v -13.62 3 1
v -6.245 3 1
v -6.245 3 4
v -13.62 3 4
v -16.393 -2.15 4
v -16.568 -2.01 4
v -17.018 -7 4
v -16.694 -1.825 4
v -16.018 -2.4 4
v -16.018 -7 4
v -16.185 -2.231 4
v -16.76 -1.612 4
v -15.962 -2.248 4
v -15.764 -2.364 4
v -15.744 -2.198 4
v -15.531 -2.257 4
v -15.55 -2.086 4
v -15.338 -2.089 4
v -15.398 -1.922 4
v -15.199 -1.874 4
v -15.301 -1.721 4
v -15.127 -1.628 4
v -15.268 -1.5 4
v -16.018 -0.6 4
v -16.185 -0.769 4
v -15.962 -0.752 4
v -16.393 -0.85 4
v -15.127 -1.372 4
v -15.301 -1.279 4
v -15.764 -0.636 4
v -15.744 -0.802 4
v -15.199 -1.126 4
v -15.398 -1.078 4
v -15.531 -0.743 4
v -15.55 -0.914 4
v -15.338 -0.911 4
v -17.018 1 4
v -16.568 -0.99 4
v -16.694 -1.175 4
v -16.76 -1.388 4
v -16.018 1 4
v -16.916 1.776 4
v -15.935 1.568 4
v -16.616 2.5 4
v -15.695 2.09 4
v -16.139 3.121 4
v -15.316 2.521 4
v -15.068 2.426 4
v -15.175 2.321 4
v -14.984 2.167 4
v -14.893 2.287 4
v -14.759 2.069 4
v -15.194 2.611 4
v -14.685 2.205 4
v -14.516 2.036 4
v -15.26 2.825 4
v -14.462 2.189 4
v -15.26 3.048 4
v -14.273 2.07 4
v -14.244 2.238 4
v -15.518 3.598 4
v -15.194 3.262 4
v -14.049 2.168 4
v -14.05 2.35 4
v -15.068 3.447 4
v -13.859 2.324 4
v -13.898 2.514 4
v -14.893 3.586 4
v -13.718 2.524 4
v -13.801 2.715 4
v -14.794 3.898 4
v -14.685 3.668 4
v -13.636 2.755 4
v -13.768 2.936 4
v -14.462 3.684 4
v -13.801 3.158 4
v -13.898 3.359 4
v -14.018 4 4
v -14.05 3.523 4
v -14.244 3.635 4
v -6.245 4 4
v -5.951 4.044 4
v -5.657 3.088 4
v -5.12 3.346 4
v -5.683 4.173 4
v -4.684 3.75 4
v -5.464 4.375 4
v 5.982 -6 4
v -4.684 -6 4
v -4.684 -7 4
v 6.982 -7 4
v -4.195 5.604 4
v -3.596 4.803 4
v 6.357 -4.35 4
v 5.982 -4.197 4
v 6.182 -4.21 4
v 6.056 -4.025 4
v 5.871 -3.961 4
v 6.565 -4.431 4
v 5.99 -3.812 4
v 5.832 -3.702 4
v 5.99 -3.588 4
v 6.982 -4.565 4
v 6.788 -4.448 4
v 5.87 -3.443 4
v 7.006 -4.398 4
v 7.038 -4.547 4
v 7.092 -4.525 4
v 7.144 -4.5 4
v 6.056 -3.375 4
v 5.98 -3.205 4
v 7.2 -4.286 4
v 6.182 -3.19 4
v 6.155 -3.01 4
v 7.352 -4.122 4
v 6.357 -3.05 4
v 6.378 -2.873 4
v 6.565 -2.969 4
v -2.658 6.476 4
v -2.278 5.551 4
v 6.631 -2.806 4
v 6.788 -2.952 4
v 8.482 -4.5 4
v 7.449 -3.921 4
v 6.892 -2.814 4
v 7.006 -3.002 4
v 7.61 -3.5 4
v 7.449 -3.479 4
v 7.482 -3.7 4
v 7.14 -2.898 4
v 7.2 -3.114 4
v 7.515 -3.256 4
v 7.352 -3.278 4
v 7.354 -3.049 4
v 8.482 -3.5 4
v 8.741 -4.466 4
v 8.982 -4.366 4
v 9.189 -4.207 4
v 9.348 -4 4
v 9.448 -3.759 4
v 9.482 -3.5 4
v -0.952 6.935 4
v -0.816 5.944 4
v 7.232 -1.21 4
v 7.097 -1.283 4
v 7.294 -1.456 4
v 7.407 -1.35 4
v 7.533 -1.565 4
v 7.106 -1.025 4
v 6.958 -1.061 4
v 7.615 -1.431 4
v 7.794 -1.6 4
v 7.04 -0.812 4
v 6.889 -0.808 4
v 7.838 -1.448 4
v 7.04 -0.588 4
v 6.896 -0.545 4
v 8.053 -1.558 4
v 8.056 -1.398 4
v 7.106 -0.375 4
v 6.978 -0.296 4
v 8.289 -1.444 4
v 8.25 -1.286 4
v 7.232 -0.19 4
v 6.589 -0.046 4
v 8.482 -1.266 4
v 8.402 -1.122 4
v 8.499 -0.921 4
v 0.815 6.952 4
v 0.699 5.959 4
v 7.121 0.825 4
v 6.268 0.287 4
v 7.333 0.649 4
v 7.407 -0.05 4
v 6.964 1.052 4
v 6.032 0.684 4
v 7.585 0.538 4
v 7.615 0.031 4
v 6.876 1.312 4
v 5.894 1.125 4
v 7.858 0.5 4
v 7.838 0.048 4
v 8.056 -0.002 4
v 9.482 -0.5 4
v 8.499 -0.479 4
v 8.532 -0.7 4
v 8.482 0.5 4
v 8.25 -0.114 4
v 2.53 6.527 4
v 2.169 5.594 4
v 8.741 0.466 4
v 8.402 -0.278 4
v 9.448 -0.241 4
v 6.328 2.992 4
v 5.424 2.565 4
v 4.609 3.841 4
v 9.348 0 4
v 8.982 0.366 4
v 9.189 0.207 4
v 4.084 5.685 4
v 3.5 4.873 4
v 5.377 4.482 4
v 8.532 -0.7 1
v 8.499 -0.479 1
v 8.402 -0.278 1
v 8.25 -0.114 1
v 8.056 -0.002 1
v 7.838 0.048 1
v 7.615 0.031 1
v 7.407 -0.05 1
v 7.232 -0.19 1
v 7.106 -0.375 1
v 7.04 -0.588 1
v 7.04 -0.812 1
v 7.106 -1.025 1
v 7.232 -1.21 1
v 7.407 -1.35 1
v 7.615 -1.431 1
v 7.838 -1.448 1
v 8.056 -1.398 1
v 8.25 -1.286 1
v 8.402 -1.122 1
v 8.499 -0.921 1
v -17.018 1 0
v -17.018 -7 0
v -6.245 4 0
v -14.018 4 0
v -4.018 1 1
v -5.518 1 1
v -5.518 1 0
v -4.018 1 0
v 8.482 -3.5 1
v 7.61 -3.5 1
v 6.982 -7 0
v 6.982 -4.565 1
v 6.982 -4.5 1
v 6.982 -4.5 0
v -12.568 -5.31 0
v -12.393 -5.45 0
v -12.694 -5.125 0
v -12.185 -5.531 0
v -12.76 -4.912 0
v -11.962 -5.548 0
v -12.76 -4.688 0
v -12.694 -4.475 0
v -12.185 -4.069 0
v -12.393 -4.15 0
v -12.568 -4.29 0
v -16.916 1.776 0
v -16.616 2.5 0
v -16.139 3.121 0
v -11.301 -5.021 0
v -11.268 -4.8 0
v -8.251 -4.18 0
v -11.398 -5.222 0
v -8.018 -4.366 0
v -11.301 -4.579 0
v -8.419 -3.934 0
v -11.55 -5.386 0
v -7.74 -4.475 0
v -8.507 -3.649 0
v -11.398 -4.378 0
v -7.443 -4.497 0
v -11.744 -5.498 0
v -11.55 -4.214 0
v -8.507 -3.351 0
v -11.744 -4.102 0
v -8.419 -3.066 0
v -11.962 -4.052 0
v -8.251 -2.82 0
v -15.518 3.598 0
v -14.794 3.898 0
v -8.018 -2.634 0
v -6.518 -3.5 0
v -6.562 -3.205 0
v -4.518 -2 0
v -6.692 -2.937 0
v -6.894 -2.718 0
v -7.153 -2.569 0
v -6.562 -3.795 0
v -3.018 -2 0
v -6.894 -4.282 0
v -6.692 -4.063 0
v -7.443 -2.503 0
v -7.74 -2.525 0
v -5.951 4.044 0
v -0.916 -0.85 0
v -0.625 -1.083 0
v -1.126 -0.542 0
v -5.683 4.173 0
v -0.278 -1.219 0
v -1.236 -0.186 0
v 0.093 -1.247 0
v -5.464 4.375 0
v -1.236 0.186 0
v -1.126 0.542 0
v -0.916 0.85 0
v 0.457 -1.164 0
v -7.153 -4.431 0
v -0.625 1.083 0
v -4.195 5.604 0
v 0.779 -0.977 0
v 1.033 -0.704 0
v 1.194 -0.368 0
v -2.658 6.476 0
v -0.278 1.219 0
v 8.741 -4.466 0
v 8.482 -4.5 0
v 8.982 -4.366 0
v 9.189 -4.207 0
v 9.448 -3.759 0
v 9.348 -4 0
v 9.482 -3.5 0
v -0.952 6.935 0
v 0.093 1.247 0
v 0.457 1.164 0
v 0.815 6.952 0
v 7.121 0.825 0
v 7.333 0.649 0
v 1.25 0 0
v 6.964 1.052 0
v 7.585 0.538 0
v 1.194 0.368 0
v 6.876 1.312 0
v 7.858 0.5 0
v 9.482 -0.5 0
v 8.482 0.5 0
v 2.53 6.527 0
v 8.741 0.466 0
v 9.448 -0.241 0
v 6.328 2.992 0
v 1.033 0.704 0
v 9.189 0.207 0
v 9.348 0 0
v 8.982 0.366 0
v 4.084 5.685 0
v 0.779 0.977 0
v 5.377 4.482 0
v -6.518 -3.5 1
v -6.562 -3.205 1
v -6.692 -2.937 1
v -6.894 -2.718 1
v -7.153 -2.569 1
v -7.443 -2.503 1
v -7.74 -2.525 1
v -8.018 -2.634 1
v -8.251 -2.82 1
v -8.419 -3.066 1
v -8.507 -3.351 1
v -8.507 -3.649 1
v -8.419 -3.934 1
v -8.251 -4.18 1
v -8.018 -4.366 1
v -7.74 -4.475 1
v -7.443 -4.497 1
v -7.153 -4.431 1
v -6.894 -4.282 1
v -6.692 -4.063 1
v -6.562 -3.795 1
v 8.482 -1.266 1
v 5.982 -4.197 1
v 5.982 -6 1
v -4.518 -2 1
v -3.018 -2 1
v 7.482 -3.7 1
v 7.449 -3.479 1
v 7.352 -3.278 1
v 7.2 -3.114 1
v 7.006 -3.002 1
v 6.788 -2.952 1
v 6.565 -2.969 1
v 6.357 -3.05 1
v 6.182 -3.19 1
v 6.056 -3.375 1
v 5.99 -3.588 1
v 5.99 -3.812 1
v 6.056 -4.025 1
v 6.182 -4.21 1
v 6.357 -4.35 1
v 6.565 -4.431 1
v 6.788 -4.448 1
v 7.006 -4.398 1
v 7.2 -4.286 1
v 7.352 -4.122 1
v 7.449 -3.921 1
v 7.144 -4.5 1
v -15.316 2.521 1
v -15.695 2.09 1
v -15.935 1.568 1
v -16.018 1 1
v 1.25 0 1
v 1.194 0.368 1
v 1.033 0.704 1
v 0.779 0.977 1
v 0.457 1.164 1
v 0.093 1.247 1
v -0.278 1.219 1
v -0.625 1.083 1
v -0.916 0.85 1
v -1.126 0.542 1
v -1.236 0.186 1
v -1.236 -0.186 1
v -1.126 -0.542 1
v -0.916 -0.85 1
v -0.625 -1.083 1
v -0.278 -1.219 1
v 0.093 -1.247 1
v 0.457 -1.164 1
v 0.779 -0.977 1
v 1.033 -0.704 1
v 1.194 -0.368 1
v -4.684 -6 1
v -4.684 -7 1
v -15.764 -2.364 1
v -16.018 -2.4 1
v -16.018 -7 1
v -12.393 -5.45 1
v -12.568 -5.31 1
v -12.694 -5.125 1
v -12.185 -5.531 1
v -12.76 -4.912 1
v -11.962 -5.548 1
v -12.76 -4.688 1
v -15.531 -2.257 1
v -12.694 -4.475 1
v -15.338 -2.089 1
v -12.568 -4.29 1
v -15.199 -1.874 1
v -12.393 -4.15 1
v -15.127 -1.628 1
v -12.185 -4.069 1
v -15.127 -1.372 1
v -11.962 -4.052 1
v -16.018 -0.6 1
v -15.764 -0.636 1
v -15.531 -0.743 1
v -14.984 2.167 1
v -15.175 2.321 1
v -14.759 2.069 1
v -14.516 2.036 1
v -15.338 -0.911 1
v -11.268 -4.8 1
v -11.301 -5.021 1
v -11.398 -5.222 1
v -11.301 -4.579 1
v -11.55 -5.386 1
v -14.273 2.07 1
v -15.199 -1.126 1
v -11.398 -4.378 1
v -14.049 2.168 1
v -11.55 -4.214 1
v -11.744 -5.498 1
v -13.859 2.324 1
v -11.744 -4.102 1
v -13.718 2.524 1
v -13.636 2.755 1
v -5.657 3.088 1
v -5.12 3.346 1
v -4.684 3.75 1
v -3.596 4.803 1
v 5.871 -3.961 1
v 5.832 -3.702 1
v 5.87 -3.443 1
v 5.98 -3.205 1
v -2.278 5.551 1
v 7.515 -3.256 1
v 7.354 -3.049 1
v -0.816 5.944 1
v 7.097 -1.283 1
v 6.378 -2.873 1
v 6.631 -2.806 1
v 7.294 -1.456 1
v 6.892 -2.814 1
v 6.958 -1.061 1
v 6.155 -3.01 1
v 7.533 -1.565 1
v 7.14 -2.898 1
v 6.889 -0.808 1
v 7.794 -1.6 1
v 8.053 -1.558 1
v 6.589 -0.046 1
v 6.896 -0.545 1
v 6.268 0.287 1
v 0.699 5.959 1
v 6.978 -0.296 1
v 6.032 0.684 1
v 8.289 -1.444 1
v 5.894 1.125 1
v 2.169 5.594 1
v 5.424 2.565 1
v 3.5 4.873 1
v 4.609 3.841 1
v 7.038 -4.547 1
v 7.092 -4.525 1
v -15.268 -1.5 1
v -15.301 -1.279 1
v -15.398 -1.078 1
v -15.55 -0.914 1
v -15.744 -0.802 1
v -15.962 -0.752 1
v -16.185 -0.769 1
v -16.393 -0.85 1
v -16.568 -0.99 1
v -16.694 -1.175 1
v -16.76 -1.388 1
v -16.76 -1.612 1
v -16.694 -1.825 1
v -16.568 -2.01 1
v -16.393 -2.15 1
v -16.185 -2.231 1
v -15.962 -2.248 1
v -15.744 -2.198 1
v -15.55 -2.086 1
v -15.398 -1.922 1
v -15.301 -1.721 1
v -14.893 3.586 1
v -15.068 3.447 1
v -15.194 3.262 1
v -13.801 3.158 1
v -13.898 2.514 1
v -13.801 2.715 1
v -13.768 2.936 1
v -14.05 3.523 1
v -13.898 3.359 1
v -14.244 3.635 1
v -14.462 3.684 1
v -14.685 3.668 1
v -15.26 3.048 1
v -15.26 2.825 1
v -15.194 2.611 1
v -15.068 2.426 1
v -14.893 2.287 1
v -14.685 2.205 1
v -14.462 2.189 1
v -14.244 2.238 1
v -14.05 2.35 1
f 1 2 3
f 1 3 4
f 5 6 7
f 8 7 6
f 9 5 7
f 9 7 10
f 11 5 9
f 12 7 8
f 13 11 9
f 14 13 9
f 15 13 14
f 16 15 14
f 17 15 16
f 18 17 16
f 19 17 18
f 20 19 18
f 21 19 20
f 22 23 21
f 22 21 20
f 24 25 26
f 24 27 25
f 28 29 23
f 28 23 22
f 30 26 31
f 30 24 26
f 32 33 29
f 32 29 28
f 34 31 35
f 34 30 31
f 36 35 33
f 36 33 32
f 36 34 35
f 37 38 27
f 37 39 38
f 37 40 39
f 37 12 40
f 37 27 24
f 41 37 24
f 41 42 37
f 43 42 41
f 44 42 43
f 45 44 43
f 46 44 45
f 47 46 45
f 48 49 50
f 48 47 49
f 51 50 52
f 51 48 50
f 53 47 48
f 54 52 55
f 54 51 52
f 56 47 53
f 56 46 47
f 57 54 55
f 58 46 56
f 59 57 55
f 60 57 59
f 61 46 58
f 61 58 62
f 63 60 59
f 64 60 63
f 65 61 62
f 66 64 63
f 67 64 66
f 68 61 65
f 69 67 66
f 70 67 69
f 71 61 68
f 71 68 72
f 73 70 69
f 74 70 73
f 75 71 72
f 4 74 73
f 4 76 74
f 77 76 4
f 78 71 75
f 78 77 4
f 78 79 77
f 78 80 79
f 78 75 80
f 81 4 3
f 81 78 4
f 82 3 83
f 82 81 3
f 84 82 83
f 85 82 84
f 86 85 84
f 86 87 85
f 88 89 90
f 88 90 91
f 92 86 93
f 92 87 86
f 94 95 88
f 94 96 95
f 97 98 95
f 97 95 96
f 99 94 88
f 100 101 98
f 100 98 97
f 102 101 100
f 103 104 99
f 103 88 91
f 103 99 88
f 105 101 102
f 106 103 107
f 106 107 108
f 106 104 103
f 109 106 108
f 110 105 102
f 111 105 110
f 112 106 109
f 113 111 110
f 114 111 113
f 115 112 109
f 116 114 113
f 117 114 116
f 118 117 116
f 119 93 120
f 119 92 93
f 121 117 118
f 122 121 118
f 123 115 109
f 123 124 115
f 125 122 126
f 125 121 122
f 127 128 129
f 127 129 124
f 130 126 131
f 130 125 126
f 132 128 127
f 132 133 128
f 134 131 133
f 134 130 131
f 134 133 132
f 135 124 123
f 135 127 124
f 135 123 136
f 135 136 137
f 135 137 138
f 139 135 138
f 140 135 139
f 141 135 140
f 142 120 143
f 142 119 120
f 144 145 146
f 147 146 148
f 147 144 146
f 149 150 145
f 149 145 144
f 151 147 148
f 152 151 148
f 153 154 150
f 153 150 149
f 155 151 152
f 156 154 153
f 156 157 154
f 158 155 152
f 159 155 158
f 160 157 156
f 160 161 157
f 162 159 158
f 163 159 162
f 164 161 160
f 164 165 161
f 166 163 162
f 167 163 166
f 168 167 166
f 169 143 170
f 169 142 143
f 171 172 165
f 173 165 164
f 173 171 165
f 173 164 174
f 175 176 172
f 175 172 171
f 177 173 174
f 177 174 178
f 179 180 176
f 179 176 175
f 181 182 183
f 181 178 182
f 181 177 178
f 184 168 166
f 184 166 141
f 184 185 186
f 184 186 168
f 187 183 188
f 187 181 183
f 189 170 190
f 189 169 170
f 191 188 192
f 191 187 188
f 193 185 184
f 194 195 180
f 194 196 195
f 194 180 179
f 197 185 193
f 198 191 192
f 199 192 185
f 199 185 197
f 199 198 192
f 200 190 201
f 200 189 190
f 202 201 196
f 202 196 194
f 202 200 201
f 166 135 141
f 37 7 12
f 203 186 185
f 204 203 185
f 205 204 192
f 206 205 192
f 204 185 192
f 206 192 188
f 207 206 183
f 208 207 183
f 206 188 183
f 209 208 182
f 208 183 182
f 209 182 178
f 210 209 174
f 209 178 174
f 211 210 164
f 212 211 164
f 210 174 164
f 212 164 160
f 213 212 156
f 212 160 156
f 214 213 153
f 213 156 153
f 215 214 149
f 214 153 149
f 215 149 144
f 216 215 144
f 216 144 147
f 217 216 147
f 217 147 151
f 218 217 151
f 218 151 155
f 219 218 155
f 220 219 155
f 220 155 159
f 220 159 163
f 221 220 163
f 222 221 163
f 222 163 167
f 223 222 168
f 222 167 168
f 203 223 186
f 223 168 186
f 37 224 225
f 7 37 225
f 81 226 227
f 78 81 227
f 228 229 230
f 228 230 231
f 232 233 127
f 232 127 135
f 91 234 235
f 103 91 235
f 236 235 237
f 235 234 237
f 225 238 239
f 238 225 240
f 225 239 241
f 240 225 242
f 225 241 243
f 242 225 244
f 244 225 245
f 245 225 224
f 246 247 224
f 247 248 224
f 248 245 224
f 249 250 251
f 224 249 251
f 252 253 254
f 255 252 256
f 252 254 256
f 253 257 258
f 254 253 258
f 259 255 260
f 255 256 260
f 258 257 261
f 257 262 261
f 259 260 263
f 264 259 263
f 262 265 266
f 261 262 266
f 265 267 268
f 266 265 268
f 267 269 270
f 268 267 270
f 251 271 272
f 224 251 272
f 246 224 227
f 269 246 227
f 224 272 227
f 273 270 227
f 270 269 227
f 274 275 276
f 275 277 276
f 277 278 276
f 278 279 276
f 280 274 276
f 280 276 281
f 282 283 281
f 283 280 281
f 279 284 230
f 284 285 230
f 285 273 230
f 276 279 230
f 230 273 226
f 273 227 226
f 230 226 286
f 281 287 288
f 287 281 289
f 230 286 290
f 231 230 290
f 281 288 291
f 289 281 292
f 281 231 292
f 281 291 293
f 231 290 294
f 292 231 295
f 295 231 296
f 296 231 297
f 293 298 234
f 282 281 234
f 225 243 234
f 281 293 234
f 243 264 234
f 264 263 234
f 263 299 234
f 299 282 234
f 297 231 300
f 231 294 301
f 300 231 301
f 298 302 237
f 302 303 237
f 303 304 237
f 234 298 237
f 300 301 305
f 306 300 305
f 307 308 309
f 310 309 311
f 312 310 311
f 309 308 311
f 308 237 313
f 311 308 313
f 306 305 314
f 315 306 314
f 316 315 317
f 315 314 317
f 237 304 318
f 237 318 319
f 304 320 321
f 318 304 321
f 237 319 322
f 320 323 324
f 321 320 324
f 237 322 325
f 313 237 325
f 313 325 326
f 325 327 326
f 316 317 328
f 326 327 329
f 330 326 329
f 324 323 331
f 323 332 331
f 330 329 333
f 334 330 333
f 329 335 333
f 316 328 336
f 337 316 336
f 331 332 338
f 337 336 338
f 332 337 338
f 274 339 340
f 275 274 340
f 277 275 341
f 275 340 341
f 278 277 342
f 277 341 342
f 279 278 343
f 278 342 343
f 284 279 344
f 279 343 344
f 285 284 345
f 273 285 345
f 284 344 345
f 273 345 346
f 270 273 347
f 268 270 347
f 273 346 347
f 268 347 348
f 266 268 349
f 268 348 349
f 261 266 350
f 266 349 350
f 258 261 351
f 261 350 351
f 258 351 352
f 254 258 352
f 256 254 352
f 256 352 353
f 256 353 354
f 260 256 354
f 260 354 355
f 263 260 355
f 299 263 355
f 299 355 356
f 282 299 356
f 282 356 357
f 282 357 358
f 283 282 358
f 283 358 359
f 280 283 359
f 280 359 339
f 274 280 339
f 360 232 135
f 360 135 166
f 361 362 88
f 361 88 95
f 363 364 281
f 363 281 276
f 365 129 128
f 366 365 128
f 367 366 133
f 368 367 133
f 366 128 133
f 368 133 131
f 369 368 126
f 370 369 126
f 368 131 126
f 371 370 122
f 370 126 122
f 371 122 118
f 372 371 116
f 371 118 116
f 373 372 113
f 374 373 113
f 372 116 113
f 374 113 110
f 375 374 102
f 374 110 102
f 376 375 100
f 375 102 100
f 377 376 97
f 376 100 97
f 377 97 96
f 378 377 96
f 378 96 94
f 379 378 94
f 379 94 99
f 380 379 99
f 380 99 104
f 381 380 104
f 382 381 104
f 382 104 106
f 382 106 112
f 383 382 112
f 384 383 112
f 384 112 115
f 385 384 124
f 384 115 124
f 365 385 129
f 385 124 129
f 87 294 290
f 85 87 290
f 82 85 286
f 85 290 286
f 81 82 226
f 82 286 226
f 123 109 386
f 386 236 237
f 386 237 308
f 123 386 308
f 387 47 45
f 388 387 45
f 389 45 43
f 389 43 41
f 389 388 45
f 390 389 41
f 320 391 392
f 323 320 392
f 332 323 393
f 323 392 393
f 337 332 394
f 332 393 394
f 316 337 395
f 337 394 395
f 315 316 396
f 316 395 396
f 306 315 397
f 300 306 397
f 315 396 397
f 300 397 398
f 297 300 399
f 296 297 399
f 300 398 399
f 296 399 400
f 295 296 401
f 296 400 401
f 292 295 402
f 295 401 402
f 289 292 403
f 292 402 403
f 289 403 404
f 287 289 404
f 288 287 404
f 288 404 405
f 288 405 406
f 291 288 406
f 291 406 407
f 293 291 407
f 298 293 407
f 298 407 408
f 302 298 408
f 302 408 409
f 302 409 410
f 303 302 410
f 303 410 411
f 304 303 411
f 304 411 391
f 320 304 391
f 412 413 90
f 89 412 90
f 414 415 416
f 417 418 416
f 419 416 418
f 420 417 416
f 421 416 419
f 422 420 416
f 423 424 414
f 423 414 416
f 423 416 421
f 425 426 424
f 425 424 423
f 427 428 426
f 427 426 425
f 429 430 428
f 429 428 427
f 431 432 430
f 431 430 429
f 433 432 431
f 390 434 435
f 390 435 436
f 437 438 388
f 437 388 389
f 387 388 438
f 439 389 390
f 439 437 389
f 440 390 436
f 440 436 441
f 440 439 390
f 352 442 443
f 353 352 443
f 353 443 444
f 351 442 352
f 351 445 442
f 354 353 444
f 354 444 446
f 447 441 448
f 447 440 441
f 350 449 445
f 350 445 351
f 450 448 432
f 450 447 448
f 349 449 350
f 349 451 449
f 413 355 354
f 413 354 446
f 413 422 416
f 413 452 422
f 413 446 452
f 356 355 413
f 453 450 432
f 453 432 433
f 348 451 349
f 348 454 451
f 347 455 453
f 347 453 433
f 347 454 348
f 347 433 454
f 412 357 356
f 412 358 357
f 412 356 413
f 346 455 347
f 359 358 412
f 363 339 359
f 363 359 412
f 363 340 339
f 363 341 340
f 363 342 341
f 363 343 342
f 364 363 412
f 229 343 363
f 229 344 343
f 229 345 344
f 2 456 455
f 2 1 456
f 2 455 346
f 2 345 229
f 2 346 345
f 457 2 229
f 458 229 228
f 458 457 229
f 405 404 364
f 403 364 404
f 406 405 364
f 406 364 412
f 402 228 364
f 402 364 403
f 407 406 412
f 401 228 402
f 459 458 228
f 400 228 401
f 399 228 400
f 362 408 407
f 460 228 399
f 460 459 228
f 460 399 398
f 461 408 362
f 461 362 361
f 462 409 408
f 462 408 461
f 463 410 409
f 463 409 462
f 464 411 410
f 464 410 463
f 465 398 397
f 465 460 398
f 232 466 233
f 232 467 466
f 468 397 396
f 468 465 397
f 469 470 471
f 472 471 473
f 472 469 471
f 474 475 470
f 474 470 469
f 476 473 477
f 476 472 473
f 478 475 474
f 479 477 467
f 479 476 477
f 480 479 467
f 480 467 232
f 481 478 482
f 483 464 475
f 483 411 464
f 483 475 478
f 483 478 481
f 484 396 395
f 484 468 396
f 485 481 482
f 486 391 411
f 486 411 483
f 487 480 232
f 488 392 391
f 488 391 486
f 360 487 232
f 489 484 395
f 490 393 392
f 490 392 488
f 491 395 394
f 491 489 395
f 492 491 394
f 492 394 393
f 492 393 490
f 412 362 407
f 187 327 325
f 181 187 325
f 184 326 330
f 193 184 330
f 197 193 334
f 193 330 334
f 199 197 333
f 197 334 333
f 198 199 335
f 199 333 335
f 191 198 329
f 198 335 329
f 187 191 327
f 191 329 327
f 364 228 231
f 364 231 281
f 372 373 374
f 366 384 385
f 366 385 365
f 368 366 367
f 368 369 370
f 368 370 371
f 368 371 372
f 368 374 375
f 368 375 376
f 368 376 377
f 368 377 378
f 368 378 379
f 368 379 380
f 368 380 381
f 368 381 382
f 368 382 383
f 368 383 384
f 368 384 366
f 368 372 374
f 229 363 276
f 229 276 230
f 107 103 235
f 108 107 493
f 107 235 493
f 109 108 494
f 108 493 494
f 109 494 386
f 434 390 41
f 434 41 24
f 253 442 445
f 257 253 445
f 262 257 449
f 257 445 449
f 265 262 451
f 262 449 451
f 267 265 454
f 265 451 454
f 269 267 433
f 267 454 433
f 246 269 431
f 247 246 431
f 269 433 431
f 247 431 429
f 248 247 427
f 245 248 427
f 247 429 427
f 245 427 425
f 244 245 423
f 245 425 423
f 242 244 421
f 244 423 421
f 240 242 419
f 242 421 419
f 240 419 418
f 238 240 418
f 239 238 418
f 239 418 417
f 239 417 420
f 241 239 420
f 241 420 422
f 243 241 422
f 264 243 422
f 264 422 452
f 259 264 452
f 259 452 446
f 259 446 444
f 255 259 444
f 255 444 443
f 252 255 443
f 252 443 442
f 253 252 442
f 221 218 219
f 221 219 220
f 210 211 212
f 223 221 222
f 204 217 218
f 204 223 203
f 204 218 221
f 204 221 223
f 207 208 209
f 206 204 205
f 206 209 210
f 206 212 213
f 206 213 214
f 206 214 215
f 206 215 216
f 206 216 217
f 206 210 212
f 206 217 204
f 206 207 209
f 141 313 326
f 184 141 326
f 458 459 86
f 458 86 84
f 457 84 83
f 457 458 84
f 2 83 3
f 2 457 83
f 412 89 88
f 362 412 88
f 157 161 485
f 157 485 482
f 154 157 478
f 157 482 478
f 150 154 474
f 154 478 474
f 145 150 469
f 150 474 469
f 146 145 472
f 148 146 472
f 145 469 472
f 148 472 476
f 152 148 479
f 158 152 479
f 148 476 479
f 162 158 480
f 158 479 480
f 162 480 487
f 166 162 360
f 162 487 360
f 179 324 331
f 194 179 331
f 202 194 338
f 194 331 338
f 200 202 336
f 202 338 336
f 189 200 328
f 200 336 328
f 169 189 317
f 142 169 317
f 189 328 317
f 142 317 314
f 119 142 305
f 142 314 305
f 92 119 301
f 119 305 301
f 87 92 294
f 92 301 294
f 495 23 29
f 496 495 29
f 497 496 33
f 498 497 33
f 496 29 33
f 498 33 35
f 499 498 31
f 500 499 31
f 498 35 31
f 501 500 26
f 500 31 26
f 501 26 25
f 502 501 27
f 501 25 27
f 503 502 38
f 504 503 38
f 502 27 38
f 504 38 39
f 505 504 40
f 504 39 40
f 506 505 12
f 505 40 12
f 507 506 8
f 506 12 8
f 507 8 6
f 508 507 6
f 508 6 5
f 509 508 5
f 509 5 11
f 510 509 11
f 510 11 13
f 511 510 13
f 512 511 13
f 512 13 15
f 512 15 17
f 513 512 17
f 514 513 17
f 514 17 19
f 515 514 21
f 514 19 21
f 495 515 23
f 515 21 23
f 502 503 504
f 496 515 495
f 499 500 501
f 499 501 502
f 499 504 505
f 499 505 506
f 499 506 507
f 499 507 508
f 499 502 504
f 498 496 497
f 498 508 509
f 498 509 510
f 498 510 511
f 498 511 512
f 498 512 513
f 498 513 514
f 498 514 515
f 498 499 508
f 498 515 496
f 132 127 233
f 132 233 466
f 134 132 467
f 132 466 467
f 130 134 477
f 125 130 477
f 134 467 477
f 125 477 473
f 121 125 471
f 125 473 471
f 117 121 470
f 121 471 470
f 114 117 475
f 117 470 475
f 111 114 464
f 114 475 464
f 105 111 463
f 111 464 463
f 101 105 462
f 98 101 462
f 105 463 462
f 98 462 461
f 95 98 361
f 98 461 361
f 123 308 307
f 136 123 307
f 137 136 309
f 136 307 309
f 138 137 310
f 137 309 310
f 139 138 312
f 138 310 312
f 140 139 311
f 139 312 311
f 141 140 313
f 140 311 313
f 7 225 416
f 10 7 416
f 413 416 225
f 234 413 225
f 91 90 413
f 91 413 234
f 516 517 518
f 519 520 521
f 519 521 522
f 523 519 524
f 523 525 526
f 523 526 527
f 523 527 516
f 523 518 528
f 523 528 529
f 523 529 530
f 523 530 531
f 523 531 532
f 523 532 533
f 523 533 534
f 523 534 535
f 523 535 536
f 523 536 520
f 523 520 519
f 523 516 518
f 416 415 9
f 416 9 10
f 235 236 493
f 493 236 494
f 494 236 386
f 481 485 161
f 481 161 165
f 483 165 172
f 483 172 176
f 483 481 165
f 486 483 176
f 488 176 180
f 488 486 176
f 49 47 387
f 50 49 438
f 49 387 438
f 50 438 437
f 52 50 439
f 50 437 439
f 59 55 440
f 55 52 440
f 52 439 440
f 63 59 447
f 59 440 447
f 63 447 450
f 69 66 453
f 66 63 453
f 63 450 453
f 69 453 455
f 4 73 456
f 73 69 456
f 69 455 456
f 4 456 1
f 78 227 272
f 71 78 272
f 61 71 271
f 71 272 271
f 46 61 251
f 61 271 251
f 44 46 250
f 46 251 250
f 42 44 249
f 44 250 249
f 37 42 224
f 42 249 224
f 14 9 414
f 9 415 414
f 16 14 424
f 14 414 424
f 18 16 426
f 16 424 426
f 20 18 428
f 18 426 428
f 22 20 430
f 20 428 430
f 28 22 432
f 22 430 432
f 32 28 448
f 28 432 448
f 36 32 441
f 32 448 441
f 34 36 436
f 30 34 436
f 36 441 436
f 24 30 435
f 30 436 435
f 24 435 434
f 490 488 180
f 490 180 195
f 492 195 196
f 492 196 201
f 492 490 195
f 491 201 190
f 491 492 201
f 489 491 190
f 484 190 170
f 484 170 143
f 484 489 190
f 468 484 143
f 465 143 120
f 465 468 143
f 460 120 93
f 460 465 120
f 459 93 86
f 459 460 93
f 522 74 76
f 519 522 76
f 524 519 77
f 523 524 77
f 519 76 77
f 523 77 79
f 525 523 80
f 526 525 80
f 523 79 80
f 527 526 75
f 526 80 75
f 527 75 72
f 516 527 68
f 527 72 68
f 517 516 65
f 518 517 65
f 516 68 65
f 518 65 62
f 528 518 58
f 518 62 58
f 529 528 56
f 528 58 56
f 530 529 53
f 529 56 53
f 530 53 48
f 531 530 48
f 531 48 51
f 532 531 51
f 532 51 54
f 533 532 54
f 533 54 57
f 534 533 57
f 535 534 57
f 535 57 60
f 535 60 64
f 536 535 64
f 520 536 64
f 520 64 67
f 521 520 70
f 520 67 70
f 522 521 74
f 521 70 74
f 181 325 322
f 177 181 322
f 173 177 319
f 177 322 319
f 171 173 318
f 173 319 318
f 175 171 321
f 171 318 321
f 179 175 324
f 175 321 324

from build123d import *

# Parameters (mm, degrees)
BOSS_EXTRUDE1_DEPTH = 4
SHELL1_START        = 1
SHELL1_DEPTH        = 3
SKETCH2_R           = 1.25
SKETCH2_R_2         = 0.75
SKETCH2_R_3         = 1
CUT_EXTRUDE1_DEPTH  = 10
SKETCH3_W           = 10.665868521
SKETCH3_H           = 3
BOSS_EXTRUDE2_DEPTH = 1
SKETCH4_R           = 0.9
BOSS_EXTRUDE3_DEPTH = 3
SKETCH5_R           = 0.75
CUT_EXTRUDE2_DEPTH  = 3


# Read off the part's stored shape, not the designer's step: Shell1
with BuildPart() as part:
    # Sketch1 → Boss-Extrude1 (new body)
    with BuildSketch(Plane.XY):
        with BuildLine():
            Line((-17.017879978, -7), (6.982120022, -7))
            Line((6.982120022, -7), (6.982120022, -5.5))
            Line((6.982120022, -5.5), (6.982120022, -4.5))
            Line((6.982120022, -4.5), (7.982120022, -4.5))
            Line((7.982120022, -4.5), (8.482120022, -4.5))
            ThreePointArc((8.482120022, -4.5), (9.189226803, -4.207106781), (9.482120022, -3.5))
            Line((9.482120022, -3.5), (9.482120022, -0.5))
            ThreePointArc((9.482120022, -0.5), (9.189226803, 0.207106781), (8.482120022, 0.5))
            Line((8.482120022, 0.5), (7.858116823, 0.5))
            ThreePointArc((7.858116823, 0.5), (7.220739384, 0.72944825), (6.87585222, 1.3125))
            ThreePointArc((6.87585222, 1.3125), (1.68605895, 6.793909421), (-5.464373249, 4.375))
            ThreePointArc((-5.464373249, 4.375), (-5.811985297, 4.098612181), (-6.244997998, 4))
            Line((-6.244997998, 4), (-14.017879978, 4))
            ThreePointArc((-14.017879978, 4), (-16.139200322, 3.121320344), (-17.017879978, 1))
            Line((-17.017879978, 1), (-17.017879978, -7))
        make_face()
    extrude(amount=BOSS_EXTRUDE1_DEPTH)

    # Shell1 outline → Shell1 (cut)
    with BuildSketch(Plane.XY.offset(SHELL1_START)):
        with BuildLine():
            Line((-16.017879978, 1), (-16.017879978, -7))
            Line((-16.017879978, -7), (5.982120022, -7))
            Line((5.982120022, -7), (5.982120022, -3.5))
            Line((5.982120022, -3.5), (8.482120022, -3.5))
            Line((8.482120022, -3.5), (8.482120022, -0.5))
            Line((8.482120022, -0.5), (7.858116823, -0.5))
            ThreePointArc((7.858116823, -0.5), (6.583361944, -0.041103501), (5.893587617, 1.125))
            ThreePointArc((5.893587617, 1.125), (1.445193386, 5.823350932), (-4.683748499, 3.75))
            ThreePointArc((-4.683748499, 3.75), (-5.378972594, 3.197224362), (-6.244997998, 3))
            Line((-6.244997998, 3), (-14.017879978, 3))
            ThreePointArc((-14.017879978, 3), (-15.43209354, 2.414213562), (-16.017879978, 1))
        make_face()
    extrude(amount=SHELL1_DEPTH, mode=Mode.SUBTRACT)

    # Sketch2 → Cut-Extrude1 (cut)
    with BuildSketch(Plane.XY.offset(1)):
        Circle(SKETCH2_R)
        with Locations((-12.017879978, -4.8)):
            Circle(SKETCH2_R_2)
        with Locations((-7.517879978, -3.5)):
            Circle(SKETCH2_R_3)
        Polygon((-5.517879978, 1), (-4.017879978, 1), (-3.017879978, -2), (-4.517879978, -2), align=None)
    extrude(amount=-CUT_EXTRUDE1_DEPTH, mode=Mode.SUBTRACT)

    # Sketch3 → Boss-Extrude2 (add)
    with BuildSketch(Plane.XZ.offset(7)):
        with Locations((0.649185762, 2.5)):
            Rectangle(SKETCH3_W, SKETCH3_H)
    extrude(amount=-BOSS_EXTRUDE2_DEPTH)

    # Sketch4 → Boss-Extrude3 (add)
    with BuildSketch(Plane.XY.offset(1)):
        with Locations((-14.517879978, 2.936491673)):
            Circle(SKETCH4_R)
        with Locations((-16.017879978, -1.5)):
            Circle(SKETCH4_R)
        with Locations((7.782120022, -0.7)):
            Circle(SKETCH4_R)
        with Locations((6.732120022, -3.7)):
            Circle(SKETCH4_R)
    extrude(amount=BOSS_EXTRUDE3_DEPTH)

    # Sketch5 → Cut-Extrude2 (cut)
    with BuildSketch(Plane.XY.offset(4)):
        with Locations((-14.517879978, 2.936491673)):
            Circle(SKETCH5_R)
        with Locations((-16.017879978, -1.5)):
            Circle(SKETCH5_R)
        with Locations((6.732120022, -3.7)):
            Circle(SKETCH5_R)
        with Locations((7.782120022, -0.7)):
            Circle(SKETCH5_R)
    extrude(amount=-CUT_EXTRUDE2_DEPTH, mode=Mode.SUBTRACT)


solid = part.part
